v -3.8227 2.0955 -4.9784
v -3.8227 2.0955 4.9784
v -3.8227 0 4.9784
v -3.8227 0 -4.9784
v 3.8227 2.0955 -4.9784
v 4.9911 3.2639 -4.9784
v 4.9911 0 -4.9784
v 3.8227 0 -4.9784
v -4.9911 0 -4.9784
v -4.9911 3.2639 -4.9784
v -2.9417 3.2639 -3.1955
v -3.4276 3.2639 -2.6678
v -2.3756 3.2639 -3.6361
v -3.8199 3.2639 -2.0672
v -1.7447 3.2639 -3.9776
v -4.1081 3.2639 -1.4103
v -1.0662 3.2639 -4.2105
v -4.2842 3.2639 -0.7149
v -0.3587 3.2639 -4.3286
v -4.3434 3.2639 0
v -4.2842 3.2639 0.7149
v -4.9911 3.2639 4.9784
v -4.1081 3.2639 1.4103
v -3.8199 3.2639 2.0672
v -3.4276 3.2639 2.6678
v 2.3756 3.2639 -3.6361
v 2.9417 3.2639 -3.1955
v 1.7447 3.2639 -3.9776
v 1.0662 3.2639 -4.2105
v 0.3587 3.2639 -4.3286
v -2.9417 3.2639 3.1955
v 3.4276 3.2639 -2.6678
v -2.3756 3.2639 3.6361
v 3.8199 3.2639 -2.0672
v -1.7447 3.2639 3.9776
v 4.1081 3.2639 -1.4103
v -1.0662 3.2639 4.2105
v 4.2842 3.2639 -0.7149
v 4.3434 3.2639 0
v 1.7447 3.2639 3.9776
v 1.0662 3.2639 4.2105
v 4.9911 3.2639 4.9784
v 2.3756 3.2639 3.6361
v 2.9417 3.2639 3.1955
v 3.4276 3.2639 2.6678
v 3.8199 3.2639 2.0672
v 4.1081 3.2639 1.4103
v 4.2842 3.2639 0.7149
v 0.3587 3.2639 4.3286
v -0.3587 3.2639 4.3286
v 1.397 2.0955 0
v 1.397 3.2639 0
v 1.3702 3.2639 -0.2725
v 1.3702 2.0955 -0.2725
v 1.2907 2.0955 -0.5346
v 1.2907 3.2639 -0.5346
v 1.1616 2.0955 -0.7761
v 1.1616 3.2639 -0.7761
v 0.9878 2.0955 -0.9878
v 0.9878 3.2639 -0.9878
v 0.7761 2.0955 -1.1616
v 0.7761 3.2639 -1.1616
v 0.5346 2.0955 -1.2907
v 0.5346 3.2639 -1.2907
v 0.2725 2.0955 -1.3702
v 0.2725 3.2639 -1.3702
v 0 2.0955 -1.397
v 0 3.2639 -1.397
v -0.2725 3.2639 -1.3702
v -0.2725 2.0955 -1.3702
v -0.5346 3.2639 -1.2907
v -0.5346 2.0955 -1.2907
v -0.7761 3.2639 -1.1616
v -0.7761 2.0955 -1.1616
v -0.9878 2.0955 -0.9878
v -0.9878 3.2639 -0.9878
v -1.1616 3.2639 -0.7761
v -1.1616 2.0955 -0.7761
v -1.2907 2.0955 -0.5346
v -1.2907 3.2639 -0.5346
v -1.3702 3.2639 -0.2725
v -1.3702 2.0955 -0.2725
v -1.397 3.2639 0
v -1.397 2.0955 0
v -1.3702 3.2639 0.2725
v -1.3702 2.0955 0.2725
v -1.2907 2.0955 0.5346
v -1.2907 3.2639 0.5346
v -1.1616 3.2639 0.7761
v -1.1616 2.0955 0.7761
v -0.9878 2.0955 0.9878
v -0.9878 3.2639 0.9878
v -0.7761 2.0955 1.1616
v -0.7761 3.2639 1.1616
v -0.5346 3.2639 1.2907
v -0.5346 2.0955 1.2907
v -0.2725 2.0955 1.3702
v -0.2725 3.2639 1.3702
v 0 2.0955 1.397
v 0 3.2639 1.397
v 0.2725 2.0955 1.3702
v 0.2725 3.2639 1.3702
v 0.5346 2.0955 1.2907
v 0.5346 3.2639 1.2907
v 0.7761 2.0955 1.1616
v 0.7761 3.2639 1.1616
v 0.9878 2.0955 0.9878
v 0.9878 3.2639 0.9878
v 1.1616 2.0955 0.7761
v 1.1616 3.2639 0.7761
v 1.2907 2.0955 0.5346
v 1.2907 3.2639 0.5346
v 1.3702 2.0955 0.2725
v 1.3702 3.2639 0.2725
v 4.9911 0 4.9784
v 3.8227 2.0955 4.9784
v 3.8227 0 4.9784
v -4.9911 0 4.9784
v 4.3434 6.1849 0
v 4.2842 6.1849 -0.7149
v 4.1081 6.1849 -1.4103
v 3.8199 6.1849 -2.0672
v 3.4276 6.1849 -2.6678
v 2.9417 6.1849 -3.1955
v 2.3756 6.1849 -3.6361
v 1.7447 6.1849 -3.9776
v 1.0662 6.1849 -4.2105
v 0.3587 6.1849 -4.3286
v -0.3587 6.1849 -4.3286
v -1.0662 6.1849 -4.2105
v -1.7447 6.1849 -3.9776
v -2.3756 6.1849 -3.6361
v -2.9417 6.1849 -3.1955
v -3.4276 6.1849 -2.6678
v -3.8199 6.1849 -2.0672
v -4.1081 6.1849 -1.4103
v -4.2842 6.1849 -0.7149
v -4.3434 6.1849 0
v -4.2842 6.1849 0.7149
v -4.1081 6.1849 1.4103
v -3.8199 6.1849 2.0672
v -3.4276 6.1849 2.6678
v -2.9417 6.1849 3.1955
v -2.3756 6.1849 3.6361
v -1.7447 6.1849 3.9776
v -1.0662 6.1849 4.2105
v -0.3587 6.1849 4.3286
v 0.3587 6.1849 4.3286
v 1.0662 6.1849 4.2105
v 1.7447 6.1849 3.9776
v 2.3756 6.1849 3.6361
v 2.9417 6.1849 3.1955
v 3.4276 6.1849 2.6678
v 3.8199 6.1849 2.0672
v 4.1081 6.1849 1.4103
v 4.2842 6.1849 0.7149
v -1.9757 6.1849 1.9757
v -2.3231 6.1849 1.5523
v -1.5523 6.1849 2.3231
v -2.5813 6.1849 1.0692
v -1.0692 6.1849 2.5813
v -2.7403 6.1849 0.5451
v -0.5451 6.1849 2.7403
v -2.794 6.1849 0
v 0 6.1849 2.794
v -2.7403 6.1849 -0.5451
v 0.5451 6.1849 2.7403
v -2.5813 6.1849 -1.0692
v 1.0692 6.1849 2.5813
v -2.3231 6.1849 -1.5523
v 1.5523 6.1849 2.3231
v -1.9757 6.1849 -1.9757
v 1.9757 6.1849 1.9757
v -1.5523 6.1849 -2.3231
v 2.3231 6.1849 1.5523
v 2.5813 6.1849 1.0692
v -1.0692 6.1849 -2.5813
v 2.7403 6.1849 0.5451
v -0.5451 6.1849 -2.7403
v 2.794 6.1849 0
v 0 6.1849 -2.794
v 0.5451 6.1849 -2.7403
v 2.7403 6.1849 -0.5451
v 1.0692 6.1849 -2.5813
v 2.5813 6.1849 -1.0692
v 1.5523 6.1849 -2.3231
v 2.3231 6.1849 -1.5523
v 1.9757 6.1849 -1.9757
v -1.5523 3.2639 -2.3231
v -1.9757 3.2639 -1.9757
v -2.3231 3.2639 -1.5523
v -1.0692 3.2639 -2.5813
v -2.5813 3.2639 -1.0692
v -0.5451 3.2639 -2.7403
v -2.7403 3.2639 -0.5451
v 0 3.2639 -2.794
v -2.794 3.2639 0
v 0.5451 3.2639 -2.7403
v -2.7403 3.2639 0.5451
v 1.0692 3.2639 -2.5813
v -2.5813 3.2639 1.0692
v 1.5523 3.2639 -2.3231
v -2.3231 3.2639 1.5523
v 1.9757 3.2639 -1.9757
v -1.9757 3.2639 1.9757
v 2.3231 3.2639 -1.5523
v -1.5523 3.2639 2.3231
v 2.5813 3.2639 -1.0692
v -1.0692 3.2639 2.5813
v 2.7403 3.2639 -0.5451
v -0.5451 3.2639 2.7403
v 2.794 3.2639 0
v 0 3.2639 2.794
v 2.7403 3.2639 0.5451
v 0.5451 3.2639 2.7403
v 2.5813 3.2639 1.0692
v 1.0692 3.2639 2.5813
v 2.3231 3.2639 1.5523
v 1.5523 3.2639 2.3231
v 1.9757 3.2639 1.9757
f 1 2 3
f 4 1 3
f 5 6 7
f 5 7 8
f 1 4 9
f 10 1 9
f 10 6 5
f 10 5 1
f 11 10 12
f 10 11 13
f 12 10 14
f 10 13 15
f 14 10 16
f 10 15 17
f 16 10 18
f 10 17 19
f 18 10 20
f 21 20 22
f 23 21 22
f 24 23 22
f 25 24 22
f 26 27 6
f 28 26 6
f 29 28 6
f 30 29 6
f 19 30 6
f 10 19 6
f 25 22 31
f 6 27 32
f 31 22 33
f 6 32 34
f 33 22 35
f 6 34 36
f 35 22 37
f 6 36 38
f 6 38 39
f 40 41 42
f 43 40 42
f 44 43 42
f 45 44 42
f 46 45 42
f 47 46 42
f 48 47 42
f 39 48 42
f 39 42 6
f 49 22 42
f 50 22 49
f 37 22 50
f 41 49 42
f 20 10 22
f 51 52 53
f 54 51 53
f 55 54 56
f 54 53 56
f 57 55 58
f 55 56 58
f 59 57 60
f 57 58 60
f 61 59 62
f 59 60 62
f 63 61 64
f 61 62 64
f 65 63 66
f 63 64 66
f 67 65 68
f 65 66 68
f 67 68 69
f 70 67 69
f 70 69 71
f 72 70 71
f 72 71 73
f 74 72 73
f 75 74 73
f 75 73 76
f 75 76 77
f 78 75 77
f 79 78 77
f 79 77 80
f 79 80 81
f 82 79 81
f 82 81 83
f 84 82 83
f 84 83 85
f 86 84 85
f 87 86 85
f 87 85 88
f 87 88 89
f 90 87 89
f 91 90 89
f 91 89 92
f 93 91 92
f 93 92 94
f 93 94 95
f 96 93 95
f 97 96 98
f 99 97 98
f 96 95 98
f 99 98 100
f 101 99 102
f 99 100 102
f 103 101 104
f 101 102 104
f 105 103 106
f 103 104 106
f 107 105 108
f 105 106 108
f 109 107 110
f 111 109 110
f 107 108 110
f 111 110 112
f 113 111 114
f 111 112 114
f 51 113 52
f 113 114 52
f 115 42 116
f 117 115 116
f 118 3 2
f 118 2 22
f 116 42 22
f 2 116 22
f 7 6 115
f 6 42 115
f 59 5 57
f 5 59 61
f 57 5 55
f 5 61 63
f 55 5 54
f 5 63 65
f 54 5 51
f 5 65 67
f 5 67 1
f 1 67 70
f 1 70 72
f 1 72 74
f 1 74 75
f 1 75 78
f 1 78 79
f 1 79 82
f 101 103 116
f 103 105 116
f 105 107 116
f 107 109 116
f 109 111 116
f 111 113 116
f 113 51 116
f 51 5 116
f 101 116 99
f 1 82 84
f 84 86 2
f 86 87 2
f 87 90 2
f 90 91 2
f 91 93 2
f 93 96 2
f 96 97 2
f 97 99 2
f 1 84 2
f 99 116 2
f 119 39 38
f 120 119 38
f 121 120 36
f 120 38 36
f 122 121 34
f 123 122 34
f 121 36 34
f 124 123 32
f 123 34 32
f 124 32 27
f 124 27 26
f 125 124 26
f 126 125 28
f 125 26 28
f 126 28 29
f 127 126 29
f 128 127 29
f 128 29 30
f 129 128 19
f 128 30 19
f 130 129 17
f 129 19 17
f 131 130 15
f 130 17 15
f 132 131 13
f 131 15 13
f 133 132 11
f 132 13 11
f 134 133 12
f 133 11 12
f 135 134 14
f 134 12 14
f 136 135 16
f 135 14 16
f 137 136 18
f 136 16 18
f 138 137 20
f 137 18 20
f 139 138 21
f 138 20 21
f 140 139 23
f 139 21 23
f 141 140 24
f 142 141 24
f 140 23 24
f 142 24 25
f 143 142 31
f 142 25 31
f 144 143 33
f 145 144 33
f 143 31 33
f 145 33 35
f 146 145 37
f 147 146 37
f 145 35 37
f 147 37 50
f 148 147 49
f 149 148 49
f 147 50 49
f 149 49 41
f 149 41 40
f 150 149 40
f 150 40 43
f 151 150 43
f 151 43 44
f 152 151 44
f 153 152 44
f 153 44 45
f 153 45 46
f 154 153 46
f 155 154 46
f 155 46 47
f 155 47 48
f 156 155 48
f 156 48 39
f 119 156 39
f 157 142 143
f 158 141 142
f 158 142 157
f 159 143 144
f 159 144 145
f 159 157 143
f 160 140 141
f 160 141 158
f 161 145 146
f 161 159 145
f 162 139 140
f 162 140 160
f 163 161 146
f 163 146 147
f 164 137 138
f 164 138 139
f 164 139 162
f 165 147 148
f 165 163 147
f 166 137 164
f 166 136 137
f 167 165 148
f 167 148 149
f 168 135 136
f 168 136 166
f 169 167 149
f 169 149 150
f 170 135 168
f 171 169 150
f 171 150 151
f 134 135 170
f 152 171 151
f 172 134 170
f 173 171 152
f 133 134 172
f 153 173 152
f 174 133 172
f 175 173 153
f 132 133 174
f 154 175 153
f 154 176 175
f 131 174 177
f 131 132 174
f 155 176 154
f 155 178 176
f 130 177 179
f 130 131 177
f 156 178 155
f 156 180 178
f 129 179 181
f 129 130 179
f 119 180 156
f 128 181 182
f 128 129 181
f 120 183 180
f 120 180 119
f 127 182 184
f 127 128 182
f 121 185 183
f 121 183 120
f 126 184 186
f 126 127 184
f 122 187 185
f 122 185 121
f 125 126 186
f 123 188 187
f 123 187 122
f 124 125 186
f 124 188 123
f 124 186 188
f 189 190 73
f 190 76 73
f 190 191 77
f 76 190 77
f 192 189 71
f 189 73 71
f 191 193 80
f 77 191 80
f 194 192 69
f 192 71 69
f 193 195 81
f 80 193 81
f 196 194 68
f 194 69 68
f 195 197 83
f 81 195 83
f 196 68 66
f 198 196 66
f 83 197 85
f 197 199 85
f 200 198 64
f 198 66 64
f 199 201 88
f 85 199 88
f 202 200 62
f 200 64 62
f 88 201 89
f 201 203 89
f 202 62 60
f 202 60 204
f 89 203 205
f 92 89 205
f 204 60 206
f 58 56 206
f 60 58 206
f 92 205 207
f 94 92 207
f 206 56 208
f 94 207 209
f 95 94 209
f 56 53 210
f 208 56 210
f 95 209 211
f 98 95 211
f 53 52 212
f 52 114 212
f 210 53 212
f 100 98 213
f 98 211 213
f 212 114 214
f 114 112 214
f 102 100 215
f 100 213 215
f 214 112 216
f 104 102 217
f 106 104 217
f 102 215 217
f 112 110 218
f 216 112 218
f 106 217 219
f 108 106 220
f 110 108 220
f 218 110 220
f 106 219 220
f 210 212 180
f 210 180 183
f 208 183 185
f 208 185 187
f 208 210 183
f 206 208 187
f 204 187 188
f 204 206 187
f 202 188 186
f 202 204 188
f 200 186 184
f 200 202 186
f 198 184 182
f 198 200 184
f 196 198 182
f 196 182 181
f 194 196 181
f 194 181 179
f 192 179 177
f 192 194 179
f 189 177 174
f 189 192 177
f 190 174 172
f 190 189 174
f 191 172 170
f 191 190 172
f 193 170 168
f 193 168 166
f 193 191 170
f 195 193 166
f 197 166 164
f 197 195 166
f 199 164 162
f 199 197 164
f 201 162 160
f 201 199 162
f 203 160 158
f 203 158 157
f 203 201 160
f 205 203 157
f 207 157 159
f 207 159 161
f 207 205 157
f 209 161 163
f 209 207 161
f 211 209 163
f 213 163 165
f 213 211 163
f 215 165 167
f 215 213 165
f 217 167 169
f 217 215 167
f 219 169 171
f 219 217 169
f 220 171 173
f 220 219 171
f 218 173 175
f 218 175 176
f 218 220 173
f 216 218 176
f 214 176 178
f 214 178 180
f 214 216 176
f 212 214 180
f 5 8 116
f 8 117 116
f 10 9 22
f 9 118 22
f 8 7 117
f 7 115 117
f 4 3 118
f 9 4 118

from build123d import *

# Parameters (mm, degrees)
BOSS_EXTRUDE1_DEPTH = 4.9784
SKETCH3_R           = 4.3434
SKETCH3_R_2         = 2.794
BOSS_EXTRUDE2_DEPTH = 2.921
CUT_EXTRUDE1_REACH  = 5.264
SKETCH4_R           = 1.397


with BuildPart() as part:
    # Sketch2 → Boss-Extrude1 (new body, symmetric)
    with BuildSketch(Plane.XY):
        Polygon((-3.8227, 0), (-4.9911, 0), (-4.9911, 3.2639), (4.9911, 3.2639), (4.9911, 0), (3.8227, 0), (3.8227, 2.0955), (-3.8227, 2.0955), align=None)
    extrude(amount=BOSS_EXTRUDE1_DEPTH, both=True)

    # Sketch3 → Boss-Extrude2 (add)
    with BuildSketch(Plane(origin=(0, 3.2639, 0), x_dir=(1, 0, 0), z_dir=(0, 1, 0))):
        Circle(SKETCH3_R)
        Circle(SKETCH3_R_2, mode=Mode.SUBTRACT)
    extrude(amount=BOSS_EXTRUDE2_DEPTH)

    # Sketch4 → Cut-Extrude1 (cut, up to next)
    with BuildSketch(Plane(origin=(0, 3.2639, 0), x_dir=(1, 0, 0), z_dir=(0, 1, 0)), mode=Mode.PRIVATE) as cut_extrude1_sk1:
        Circle(SKETCH4_R)
    cut_extrude1_tool1 = extrude(cut_extrude1_sk1.sketch, amount=-CUT_EXTRUDE1_REACH, mode=Mode.PRIVATE) & part.part
    add(cut_extrude1_tool1.solids().sort_by_distance((0, 3.2639, 0))[0], mode=Mode.SUBTRACT)


solid = part.part
